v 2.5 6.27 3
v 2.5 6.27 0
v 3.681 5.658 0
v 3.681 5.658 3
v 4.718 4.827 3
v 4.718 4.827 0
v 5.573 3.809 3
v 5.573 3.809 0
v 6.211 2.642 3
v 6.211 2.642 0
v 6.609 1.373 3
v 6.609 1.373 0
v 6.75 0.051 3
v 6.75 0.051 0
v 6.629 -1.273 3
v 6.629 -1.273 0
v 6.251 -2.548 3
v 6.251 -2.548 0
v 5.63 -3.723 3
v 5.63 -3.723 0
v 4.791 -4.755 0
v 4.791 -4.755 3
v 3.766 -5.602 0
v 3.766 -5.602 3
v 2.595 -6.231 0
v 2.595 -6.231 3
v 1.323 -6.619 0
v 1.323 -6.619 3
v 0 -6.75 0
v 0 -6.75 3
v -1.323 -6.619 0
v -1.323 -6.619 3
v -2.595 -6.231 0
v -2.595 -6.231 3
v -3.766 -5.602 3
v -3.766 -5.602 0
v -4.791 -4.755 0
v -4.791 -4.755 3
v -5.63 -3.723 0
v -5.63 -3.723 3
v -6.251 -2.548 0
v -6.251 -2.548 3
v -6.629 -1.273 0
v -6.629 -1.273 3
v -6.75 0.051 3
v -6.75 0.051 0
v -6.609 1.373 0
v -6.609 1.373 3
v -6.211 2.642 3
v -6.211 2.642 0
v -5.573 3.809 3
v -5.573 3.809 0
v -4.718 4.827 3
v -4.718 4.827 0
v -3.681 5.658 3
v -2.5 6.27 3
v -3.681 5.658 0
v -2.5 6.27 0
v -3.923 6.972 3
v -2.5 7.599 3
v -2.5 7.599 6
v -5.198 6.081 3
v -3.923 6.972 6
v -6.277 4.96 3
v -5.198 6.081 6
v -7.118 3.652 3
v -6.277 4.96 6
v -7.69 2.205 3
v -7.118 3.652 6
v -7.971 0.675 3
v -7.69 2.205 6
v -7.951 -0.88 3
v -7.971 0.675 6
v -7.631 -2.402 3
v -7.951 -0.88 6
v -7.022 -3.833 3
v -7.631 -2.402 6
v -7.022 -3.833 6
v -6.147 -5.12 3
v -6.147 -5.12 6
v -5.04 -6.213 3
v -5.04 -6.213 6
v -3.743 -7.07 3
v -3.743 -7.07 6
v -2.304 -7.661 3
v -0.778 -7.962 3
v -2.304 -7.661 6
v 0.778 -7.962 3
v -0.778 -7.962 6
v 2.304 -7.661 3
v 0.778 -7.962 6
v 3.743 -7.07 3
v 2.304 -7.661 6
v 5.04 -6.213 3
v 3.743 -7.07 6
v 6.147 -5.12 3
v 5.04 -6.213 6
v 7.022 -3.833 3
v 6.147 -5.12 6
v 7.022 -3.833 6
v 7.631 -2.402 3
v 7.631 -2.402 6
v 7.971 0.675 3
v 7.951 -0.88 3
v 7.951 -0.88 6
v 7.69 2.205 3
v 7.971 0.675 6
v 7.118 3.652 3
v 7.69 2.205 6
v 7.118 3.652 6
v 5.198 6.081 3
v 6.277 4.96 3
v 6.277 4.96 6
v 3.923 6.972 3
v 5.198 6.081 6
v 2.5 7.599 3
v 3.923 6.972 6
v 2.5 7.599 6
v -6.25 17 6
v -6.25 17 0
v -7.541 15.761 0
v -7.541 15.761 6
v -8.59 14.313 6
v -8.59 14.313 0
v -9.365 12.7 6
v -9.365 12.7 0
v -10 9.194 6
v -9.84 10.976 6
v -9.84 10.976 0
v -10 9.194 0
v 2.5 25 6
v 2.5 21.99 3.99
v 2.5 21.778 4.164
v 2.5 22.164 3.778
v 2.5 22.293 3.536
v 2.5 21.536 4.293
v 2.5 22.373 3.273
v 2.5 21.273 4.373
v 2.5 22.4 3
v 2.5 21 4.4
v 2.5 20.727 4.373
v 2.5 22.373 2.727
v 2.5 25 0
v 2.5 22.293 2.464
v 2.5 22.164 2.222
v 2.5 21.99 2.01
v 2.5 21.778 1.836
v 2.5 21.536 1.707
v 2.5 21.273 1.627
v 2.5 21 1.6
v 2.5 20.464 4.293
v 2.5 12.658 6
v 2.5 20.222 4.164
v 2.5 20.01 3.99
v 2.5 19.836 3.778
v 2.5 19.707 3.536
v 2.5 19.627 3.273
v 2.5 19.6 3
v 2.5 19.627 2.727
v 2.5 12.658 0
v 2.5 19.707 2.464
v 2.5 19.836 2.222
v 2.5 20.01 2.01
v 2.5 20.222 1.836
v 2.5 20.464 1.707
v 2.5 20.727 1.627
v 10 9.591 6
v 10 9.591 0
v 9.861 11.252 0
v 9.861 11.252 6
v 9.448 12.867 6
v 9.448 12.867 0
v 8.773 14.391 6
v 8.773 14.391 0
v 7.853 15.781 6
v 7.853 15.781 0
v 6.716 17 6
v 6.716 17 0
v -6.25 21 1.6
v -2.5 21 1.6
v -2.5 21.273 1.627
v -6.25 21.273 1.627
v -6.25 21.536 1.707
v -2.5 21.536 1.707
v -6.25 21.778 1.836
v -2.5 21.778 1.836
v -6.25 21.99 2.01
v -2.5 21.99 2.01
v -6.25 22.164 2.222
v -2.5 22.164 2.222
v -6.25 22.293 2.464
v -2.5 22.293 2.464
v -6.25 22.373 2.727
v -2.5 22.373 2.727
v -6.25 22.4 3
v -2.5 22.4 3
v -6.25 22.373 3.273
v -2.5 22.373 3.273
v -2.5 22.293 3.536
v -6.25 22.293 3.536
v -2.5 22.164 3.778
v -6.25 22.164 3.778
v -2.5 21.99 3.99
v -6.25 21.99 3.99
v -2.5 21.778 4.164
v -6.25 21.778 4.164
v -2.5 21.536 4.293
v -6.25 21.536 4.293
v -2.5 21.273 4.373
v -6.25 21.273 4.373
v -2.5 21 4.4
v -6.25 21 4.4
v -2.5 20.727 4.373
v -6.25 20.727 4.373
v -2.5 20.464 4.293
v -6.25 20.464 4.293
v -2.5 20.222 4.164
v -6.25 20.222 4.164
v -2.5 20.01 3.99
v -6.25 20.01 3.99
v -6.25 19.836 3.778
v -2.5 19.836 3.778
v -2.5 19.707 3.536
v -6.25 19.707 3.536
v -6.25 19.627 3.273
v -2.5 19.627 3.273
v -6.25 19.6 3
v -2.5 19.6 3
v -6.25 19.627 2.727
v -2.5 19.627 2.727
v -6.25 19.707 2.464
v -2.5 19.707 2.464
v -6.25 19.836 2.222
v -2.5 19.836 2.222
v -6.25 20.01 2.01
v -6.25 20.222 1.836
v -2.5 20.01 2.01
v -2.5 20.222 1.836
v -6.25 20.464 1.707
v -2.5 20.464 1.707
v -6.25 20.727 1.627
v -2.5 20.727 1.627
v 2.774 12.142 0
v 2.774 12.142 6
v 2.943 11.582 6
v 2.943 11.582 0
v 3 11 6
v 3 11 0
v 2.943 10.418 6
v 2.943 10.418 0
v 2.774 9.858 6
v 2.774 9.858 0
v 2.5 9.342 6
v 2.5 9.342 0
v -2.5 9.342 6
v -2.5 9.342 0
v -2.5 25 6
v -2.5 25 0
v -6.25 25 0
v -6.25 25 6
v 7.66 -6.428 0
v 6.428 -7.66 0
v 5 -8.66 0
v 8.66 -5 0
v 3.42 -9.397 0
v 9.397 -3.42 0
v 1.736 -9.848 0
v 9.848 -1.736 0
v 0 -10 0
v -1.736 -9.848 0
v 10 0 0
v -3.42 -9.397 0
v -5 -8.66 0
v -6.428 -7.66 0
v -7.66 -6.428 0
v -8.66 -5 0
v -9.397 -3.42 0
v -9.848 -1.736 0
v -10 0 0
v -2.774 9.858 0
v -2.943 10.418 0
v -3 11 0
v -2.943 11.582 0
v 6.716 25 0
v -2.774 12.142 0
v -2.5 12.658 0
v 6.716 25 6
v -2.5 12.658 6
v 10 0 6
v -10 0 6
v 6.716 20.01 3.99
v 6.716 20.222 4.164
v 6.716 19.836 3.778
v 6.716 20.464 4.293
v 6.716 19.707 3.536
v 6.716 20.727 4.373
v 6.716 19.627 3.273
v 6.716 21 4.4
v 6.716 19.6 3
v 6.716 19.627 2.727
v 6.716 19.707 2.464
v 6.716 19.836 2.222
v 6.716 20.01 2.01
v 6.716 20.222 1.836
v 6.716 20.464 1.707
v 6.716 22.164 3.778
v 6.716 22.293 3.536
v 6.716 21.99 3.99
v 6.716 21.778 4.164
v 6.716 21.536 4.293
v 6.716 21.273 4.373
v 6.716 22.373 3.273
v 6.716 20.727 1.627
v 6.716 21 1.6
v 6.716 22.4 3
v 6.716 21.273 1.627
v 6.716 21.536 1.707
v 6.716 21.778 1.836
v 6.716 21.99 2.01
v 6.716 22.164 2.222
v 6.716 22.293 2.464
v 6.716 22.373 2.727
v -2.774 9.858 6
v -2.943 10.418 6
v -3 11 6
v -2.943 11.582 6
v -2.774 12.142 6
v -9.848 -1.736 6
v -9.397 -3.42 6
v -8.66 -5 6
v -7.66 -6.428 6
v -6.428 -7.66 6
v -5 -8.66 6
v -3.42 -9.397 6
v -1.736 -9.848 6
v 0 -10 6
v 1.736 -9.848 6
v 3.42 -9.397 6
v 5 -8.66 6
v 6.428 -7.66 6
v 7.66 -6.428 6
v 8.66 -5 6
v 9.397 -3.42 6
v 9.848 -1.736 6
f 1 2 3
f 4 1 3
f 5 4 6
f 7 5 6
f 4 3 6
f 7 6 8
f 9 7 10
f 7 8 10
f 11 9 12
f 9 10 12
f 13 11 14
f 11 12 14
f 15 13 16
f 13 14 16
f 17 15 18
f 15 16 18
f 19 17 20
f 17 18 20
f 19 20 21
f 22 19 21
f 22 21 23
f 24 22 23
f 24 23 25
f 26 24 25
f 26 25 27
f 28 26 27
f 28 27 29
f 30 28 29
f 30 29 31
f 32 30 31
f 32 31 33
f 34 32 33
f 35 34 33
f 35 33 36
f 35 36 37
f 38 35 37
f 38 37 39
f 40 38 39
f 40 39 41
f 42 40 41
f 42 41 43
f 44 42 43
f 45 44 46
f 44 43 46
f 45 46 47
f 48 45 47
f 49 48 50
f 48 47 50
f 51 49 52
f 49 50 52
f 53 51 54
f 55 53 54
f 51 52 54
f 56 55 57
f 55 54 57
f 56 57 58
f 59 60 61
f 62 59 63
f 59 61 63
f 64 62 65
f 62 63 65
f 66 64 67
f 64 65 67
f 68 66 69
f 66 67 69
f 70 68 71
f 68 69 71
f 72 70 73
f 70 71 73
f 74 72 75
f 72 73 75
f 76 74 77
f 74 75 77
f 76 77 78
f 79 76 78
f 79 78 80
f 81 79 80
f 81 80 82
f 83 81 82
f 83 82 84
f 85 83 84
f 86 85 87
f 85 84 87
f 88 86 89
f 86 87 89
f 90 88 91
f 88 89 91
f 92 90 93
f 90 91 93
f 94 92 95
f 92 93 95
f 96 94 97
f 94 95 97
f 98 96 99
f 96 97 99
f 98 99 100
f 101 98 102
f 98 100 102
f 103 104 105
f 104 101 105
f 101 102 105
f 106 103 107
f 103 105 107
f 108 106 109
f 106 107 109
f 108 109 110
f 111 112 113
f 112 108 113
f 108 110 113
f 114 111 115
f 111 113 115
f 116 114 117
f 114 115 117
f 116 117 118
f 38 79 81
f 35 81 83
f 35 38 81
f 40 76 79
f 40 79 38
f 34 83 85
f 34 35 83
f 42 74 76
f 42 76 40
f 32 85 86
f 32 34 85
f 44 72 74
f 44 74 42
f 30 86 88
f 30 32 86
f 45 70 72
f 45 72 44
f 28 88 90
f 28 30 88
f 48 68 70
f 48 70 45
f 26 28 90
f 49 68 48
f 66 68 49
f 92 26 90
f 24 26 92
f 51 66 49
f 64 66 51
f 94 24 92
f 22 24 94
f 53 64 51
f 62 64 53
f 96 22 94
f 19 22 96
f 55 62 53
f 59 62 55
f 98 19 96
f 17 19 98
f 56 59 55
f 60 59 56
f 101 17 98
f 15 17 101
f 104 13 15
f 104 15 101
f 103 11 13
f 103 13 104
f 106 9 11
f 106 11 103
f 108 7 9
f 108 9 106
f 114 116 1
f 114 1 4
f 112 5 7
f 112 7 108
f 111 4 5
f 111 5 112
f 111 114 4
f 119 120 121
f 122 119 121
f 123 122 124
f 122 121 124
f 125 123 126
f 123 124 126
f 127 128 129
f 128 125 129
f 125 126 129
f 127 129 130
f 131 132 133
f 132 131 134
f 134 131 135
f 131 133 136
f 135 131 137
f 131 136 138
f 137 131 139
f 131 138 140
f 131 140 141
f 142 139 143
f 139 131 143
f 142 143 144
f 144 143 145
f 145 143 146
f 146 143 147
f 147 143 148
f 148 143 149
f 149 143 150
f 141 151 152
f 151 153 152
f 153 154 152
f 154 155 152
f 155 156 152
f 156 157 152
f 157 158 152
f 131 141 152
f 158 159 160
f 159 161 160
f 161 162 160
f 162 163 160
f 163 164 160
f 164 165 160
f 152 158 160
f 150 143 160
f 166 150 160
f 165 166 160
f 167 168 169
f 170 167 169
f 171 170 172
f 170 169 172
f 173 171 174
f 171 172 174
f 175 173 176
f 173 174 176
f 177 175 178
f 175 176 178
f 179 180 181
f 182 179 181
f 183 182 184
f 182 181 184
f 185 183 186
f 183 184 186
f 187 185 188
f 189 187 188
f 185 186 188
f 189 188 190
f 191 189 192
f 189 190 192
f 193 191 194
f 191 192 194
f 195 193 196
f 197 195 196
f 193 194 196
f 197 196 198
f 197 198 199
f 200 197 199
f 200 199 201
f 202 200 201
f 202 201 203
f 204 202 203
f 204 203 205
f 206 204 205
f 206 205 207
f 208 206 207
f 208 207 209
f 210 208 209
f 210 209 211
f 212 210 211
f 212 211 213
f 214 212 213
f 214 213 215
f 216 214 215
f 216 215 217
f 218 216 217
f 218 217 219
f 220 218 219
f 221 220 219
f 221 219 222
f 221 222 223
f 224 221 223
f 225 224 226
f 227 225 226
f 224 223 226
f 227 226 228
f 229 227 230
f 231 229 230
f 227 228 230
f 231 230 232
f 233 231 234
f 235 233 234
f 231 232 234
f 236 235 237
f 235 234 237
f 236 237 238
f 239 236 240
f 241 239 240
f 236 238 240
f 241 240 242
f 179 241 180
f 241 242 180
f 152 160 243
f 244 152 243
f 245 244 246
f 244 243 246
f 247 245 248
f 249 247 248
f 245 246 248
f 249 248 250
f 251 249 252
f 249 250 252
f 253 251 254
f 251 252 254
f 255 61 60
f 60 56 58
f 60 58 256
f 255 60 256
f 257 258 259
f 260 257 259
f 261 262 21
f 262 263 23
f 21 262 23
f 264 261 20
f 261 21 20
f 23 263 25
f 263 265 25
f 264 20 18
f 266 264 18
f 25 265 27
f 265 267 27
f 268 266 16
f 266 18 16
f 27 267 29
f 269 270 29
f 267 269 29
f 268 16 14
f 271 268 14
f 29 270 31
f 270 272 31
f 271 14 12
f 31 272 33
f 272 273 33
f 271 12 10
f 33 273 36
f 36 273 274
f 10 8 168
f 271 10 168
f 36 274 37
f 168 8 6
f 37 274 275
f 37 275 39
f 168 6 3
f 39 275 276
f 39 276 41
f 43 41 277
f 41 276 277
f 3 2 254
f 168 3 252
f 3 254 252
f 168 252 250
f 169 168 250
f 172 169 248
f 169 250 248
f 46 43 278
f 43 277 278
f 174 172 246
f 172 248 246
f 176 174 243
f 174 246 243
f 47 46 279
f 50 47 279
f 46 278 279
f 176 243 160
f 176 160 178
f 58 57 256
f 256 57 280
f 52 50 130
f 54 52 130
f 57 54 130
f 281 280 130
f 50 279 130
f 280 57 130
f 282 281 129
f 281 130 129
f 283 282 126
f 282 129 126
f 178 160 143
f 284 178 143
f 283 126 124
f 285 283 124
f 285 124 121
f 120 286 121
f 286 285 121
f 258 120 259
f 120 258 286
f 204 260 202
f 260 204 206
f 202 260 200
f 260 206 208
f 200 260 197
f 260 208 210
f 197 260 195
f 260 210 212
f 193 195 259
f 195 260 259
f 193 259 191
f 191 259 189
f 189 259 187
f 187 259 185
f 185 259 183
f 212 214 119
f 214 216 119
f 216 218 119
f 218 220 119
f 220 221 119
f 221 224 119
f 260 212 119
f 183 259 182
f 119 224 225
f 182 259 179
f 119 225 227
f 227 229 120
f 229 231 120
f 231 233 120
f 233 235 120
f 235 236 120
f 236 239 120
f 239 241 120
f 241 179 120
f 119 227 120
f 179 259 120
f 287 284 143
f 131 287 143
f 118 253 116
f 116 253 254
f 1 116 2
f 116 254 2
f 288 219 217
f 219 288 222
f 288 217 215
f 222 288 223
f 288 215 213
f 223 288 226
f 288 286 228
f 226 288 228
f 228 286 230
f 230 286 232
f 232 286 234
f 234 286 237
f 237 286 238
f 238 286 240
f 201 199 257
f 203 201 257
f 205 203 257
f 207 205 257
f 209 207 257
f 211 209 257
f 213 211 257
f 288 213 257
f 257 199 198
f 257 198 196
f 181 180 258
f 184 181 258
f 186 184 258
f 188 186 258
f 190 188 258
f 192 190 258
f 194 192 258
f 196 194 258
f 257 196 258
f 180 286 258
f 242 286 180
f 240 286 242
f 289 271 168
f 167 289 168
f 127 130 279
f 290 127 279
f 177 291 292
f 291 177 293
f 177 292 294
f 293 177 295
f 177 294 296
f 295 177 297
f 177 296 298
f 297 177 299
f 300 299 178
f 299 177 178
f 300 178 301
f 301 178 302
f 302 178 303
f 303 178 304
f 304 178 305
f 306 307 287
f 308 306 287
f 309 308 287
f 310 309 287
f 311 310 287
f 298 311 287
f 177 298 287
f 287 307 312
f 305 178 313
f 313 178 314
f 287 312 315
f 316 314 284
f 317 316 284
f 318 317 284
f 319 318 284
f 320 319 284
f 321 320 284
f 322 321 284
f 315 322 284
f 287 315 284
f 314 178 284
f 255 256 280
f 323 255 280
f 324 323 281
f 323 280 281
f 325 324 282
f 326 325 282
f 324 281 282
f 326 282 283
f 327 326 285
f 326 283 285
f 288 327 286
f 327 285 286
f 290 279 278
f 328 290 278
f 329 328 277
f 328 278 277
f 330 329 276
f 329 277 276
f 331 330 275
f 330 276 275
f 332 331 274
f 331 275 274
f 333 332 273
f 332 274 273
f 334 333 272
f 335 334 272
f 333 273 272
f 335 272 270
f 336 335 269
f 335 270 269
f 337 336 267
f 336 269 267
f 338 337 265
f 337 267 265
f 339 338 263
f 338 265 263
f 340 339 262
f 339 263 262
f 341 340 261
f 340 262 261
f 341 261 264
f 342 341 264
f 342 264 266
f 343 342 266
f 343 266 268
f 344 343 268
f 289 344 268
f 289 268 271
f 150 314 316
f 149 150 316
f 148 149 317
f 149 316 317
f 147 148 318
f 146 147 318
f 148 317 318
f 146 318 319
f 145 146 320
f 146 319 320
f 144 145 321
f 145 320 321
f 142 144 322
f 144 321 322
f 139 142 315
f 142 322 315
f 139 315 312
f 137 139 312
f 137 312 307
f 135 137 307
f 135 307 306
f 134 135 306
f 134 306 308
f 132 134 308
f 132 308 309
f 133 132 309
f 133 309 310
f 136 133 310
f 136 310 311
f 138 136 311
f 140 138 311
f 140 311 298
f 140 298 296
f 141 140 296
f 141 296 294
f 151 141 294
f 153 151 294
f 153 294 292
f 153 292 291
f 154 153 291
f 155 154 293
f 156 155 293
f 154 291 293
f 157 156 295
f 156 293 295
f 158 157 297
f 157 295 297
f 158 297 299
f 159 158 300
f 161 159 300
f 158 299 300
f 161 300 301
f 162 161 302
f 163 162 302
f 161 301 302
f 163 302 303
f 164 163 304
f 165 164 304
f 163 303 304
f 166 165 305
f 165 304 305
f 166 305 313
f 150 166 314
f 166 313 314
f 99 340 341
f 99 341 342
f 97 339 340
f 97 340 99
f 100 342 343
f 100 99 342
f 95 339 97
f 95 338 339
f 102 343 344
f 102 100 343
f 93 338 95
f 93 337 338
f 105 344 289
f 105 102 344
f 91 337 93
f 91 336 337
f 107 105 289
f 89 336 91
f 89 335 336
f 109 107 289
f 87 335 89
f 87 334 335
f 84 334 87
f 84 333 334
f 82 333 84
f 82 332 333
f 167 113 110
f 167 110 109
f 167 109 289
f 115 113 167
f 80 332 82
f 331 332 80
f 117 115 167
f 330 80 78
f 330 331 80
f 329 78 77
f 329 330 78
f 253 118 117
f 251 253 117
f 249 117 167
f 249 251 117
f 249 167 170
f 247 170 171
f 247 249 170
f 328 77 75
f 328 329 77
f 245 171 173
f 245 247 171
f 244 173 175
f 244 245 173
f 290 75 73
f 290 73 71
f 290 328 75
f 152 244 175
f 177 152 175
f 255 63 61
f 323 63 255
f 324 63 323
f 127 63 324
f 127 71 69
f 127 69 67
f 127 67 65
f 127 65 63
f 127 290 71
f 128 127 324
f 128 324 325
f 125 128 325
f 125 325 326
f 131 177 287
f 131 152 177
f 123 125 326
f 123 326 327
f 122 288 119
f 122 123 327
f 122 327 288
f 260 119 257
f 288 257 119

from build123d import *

# Parameters (mm, degrees)
BOSS_EXTRUDE1_DEPTH = 6
SKETCH2_R           = 1.4
CUT_EXTRUDE1_DEPTH  = 30
SKETCH3_R           = 8
CUT_EXTRUDE2_DEPTH  = 3
FILLET1_R           = 10
FILLET2_R           = 10


with BuildPart() as part:
    # Sketch1 → Boss-Extrude1 (new body)
    with BuildSketch(Plane(origin=(0, 0, 0), x_dir=(0, 1, 0), z_dir=(0, 0, 1))):
        with BuildLine():
            Line((6.269968102, 2.5), (9.341687605, 2.5))
            ThreePointArc((9.341687605, 2.5), (11, 3), (12.658312395, 2.5))
            Line((12.658312395, 2.5), (25, 2.5))
            Line((25, 2.5), (25, 6.25))
            Line((25, 6.25), (17, 6.25))
            Line((17, 6.25), (17, 10))
            Line((17, 10), (0, 10))
            ThreePointArc((0, 10), (-10, 0), (0, -10))
            Line((0, -10), (17, -10))
            Line((17, -10), (17, -6.715626424))
            Line((17, -6.715626424), (25, -6.715626424))
            Line((25, -6.715626424), (25, -2.5))
            Line((25, -2.5), (12.658312395, -2.5))
            ThreePointArc((12.658312395, -2.5), (11, -3), (9.341687605, -2.5))
            Line((9.341687605, -2.5), (6.269968102, -2.5))
            ThreePointArc((6.269968102, -2.5), (-6.75, 0), (6.269968102, 2.5))
        make_face()
    extrude(amount=BOSS_EXTRUDE1_DEPTH)

    # Sketch2 → Cut-Extrude1 (cut)
    with BuildSketch(Plane.YZ.offset(10)):
        with Locations(Location((21, 3, 0), (0, 0, 270))):
            Circle(SKETCH2_R)
    extrude(amount=-CUT_EXTRUDE1_DEPTH, mode=Mode.SUBTRACT)

    # Sketch3 → Cut-Extrude2 (cut)
    with BuildSketch(Plane.XY.offset(6)):
        Circle(SKETCH3_R)
    extrude(amount=-CUT_EXTRUDE2_DEPTH, mode=Mode.SUBTRACT)

    # Fillet1
    # the kernel refuses this fillet: 10 mm, written as the material it takes off along each edge
    with BuildSketch(Plane(origin=(10, 17, -18.523694578), x_dir=(-1, 0, 0), z_dir=(0, 0, 1))) as fillet1_piece_1:
        with BuildLine():
            CenterArc((10, 7.409477831), FILLET1_R, 180, 47.812214848)
            Line((0, 7.409477831), (-0.2, 7.409477831))
            Line((-0.2, 7.409477831), (-0.2, 0))
            Line((-0.2, 0), (0, -0.2))
            ThreePointArc((0, -0.2), (1.642186788, -0.2), (3.150061047, -0.148189557))
            Line((3.150061047, -0.148189557), (3.284373576, 0))
        make_face()
    extrude(amount=43.047389155, mode=Mode.SUBTRACT)

    # Fillet2
    # the kernel refuses this fillet: 10 mm, written as the material it takes off along each edge
    with BuildSketch(Plane(origin=(-10, 17, -19.515618745), x_dir=(0, -1, 0), z_dir=(0, 0, 1))) as fillet2_piece_1:
        with BuildLine():
            CenterArc((7.806247498, 10), FILLET2_R, 218.682187453, 51.317812547)
            Line((0, 3.75), (-0.15612495, 3.625))
            ThreePointArc((-0.15612495, 3.625), (-0.2, 1.875), (-0.2, 0))
            Line((-0.2, 0), (0, -0.2))
            Line((0, -0.2), (7.806247498, -0.2))
            Line((7.806247498, -0.2), (7.806247498, 0))
        make_face()
    extrude(amount=45.03123749, mode=Mode.SUBTRACT)


solid = part.part
